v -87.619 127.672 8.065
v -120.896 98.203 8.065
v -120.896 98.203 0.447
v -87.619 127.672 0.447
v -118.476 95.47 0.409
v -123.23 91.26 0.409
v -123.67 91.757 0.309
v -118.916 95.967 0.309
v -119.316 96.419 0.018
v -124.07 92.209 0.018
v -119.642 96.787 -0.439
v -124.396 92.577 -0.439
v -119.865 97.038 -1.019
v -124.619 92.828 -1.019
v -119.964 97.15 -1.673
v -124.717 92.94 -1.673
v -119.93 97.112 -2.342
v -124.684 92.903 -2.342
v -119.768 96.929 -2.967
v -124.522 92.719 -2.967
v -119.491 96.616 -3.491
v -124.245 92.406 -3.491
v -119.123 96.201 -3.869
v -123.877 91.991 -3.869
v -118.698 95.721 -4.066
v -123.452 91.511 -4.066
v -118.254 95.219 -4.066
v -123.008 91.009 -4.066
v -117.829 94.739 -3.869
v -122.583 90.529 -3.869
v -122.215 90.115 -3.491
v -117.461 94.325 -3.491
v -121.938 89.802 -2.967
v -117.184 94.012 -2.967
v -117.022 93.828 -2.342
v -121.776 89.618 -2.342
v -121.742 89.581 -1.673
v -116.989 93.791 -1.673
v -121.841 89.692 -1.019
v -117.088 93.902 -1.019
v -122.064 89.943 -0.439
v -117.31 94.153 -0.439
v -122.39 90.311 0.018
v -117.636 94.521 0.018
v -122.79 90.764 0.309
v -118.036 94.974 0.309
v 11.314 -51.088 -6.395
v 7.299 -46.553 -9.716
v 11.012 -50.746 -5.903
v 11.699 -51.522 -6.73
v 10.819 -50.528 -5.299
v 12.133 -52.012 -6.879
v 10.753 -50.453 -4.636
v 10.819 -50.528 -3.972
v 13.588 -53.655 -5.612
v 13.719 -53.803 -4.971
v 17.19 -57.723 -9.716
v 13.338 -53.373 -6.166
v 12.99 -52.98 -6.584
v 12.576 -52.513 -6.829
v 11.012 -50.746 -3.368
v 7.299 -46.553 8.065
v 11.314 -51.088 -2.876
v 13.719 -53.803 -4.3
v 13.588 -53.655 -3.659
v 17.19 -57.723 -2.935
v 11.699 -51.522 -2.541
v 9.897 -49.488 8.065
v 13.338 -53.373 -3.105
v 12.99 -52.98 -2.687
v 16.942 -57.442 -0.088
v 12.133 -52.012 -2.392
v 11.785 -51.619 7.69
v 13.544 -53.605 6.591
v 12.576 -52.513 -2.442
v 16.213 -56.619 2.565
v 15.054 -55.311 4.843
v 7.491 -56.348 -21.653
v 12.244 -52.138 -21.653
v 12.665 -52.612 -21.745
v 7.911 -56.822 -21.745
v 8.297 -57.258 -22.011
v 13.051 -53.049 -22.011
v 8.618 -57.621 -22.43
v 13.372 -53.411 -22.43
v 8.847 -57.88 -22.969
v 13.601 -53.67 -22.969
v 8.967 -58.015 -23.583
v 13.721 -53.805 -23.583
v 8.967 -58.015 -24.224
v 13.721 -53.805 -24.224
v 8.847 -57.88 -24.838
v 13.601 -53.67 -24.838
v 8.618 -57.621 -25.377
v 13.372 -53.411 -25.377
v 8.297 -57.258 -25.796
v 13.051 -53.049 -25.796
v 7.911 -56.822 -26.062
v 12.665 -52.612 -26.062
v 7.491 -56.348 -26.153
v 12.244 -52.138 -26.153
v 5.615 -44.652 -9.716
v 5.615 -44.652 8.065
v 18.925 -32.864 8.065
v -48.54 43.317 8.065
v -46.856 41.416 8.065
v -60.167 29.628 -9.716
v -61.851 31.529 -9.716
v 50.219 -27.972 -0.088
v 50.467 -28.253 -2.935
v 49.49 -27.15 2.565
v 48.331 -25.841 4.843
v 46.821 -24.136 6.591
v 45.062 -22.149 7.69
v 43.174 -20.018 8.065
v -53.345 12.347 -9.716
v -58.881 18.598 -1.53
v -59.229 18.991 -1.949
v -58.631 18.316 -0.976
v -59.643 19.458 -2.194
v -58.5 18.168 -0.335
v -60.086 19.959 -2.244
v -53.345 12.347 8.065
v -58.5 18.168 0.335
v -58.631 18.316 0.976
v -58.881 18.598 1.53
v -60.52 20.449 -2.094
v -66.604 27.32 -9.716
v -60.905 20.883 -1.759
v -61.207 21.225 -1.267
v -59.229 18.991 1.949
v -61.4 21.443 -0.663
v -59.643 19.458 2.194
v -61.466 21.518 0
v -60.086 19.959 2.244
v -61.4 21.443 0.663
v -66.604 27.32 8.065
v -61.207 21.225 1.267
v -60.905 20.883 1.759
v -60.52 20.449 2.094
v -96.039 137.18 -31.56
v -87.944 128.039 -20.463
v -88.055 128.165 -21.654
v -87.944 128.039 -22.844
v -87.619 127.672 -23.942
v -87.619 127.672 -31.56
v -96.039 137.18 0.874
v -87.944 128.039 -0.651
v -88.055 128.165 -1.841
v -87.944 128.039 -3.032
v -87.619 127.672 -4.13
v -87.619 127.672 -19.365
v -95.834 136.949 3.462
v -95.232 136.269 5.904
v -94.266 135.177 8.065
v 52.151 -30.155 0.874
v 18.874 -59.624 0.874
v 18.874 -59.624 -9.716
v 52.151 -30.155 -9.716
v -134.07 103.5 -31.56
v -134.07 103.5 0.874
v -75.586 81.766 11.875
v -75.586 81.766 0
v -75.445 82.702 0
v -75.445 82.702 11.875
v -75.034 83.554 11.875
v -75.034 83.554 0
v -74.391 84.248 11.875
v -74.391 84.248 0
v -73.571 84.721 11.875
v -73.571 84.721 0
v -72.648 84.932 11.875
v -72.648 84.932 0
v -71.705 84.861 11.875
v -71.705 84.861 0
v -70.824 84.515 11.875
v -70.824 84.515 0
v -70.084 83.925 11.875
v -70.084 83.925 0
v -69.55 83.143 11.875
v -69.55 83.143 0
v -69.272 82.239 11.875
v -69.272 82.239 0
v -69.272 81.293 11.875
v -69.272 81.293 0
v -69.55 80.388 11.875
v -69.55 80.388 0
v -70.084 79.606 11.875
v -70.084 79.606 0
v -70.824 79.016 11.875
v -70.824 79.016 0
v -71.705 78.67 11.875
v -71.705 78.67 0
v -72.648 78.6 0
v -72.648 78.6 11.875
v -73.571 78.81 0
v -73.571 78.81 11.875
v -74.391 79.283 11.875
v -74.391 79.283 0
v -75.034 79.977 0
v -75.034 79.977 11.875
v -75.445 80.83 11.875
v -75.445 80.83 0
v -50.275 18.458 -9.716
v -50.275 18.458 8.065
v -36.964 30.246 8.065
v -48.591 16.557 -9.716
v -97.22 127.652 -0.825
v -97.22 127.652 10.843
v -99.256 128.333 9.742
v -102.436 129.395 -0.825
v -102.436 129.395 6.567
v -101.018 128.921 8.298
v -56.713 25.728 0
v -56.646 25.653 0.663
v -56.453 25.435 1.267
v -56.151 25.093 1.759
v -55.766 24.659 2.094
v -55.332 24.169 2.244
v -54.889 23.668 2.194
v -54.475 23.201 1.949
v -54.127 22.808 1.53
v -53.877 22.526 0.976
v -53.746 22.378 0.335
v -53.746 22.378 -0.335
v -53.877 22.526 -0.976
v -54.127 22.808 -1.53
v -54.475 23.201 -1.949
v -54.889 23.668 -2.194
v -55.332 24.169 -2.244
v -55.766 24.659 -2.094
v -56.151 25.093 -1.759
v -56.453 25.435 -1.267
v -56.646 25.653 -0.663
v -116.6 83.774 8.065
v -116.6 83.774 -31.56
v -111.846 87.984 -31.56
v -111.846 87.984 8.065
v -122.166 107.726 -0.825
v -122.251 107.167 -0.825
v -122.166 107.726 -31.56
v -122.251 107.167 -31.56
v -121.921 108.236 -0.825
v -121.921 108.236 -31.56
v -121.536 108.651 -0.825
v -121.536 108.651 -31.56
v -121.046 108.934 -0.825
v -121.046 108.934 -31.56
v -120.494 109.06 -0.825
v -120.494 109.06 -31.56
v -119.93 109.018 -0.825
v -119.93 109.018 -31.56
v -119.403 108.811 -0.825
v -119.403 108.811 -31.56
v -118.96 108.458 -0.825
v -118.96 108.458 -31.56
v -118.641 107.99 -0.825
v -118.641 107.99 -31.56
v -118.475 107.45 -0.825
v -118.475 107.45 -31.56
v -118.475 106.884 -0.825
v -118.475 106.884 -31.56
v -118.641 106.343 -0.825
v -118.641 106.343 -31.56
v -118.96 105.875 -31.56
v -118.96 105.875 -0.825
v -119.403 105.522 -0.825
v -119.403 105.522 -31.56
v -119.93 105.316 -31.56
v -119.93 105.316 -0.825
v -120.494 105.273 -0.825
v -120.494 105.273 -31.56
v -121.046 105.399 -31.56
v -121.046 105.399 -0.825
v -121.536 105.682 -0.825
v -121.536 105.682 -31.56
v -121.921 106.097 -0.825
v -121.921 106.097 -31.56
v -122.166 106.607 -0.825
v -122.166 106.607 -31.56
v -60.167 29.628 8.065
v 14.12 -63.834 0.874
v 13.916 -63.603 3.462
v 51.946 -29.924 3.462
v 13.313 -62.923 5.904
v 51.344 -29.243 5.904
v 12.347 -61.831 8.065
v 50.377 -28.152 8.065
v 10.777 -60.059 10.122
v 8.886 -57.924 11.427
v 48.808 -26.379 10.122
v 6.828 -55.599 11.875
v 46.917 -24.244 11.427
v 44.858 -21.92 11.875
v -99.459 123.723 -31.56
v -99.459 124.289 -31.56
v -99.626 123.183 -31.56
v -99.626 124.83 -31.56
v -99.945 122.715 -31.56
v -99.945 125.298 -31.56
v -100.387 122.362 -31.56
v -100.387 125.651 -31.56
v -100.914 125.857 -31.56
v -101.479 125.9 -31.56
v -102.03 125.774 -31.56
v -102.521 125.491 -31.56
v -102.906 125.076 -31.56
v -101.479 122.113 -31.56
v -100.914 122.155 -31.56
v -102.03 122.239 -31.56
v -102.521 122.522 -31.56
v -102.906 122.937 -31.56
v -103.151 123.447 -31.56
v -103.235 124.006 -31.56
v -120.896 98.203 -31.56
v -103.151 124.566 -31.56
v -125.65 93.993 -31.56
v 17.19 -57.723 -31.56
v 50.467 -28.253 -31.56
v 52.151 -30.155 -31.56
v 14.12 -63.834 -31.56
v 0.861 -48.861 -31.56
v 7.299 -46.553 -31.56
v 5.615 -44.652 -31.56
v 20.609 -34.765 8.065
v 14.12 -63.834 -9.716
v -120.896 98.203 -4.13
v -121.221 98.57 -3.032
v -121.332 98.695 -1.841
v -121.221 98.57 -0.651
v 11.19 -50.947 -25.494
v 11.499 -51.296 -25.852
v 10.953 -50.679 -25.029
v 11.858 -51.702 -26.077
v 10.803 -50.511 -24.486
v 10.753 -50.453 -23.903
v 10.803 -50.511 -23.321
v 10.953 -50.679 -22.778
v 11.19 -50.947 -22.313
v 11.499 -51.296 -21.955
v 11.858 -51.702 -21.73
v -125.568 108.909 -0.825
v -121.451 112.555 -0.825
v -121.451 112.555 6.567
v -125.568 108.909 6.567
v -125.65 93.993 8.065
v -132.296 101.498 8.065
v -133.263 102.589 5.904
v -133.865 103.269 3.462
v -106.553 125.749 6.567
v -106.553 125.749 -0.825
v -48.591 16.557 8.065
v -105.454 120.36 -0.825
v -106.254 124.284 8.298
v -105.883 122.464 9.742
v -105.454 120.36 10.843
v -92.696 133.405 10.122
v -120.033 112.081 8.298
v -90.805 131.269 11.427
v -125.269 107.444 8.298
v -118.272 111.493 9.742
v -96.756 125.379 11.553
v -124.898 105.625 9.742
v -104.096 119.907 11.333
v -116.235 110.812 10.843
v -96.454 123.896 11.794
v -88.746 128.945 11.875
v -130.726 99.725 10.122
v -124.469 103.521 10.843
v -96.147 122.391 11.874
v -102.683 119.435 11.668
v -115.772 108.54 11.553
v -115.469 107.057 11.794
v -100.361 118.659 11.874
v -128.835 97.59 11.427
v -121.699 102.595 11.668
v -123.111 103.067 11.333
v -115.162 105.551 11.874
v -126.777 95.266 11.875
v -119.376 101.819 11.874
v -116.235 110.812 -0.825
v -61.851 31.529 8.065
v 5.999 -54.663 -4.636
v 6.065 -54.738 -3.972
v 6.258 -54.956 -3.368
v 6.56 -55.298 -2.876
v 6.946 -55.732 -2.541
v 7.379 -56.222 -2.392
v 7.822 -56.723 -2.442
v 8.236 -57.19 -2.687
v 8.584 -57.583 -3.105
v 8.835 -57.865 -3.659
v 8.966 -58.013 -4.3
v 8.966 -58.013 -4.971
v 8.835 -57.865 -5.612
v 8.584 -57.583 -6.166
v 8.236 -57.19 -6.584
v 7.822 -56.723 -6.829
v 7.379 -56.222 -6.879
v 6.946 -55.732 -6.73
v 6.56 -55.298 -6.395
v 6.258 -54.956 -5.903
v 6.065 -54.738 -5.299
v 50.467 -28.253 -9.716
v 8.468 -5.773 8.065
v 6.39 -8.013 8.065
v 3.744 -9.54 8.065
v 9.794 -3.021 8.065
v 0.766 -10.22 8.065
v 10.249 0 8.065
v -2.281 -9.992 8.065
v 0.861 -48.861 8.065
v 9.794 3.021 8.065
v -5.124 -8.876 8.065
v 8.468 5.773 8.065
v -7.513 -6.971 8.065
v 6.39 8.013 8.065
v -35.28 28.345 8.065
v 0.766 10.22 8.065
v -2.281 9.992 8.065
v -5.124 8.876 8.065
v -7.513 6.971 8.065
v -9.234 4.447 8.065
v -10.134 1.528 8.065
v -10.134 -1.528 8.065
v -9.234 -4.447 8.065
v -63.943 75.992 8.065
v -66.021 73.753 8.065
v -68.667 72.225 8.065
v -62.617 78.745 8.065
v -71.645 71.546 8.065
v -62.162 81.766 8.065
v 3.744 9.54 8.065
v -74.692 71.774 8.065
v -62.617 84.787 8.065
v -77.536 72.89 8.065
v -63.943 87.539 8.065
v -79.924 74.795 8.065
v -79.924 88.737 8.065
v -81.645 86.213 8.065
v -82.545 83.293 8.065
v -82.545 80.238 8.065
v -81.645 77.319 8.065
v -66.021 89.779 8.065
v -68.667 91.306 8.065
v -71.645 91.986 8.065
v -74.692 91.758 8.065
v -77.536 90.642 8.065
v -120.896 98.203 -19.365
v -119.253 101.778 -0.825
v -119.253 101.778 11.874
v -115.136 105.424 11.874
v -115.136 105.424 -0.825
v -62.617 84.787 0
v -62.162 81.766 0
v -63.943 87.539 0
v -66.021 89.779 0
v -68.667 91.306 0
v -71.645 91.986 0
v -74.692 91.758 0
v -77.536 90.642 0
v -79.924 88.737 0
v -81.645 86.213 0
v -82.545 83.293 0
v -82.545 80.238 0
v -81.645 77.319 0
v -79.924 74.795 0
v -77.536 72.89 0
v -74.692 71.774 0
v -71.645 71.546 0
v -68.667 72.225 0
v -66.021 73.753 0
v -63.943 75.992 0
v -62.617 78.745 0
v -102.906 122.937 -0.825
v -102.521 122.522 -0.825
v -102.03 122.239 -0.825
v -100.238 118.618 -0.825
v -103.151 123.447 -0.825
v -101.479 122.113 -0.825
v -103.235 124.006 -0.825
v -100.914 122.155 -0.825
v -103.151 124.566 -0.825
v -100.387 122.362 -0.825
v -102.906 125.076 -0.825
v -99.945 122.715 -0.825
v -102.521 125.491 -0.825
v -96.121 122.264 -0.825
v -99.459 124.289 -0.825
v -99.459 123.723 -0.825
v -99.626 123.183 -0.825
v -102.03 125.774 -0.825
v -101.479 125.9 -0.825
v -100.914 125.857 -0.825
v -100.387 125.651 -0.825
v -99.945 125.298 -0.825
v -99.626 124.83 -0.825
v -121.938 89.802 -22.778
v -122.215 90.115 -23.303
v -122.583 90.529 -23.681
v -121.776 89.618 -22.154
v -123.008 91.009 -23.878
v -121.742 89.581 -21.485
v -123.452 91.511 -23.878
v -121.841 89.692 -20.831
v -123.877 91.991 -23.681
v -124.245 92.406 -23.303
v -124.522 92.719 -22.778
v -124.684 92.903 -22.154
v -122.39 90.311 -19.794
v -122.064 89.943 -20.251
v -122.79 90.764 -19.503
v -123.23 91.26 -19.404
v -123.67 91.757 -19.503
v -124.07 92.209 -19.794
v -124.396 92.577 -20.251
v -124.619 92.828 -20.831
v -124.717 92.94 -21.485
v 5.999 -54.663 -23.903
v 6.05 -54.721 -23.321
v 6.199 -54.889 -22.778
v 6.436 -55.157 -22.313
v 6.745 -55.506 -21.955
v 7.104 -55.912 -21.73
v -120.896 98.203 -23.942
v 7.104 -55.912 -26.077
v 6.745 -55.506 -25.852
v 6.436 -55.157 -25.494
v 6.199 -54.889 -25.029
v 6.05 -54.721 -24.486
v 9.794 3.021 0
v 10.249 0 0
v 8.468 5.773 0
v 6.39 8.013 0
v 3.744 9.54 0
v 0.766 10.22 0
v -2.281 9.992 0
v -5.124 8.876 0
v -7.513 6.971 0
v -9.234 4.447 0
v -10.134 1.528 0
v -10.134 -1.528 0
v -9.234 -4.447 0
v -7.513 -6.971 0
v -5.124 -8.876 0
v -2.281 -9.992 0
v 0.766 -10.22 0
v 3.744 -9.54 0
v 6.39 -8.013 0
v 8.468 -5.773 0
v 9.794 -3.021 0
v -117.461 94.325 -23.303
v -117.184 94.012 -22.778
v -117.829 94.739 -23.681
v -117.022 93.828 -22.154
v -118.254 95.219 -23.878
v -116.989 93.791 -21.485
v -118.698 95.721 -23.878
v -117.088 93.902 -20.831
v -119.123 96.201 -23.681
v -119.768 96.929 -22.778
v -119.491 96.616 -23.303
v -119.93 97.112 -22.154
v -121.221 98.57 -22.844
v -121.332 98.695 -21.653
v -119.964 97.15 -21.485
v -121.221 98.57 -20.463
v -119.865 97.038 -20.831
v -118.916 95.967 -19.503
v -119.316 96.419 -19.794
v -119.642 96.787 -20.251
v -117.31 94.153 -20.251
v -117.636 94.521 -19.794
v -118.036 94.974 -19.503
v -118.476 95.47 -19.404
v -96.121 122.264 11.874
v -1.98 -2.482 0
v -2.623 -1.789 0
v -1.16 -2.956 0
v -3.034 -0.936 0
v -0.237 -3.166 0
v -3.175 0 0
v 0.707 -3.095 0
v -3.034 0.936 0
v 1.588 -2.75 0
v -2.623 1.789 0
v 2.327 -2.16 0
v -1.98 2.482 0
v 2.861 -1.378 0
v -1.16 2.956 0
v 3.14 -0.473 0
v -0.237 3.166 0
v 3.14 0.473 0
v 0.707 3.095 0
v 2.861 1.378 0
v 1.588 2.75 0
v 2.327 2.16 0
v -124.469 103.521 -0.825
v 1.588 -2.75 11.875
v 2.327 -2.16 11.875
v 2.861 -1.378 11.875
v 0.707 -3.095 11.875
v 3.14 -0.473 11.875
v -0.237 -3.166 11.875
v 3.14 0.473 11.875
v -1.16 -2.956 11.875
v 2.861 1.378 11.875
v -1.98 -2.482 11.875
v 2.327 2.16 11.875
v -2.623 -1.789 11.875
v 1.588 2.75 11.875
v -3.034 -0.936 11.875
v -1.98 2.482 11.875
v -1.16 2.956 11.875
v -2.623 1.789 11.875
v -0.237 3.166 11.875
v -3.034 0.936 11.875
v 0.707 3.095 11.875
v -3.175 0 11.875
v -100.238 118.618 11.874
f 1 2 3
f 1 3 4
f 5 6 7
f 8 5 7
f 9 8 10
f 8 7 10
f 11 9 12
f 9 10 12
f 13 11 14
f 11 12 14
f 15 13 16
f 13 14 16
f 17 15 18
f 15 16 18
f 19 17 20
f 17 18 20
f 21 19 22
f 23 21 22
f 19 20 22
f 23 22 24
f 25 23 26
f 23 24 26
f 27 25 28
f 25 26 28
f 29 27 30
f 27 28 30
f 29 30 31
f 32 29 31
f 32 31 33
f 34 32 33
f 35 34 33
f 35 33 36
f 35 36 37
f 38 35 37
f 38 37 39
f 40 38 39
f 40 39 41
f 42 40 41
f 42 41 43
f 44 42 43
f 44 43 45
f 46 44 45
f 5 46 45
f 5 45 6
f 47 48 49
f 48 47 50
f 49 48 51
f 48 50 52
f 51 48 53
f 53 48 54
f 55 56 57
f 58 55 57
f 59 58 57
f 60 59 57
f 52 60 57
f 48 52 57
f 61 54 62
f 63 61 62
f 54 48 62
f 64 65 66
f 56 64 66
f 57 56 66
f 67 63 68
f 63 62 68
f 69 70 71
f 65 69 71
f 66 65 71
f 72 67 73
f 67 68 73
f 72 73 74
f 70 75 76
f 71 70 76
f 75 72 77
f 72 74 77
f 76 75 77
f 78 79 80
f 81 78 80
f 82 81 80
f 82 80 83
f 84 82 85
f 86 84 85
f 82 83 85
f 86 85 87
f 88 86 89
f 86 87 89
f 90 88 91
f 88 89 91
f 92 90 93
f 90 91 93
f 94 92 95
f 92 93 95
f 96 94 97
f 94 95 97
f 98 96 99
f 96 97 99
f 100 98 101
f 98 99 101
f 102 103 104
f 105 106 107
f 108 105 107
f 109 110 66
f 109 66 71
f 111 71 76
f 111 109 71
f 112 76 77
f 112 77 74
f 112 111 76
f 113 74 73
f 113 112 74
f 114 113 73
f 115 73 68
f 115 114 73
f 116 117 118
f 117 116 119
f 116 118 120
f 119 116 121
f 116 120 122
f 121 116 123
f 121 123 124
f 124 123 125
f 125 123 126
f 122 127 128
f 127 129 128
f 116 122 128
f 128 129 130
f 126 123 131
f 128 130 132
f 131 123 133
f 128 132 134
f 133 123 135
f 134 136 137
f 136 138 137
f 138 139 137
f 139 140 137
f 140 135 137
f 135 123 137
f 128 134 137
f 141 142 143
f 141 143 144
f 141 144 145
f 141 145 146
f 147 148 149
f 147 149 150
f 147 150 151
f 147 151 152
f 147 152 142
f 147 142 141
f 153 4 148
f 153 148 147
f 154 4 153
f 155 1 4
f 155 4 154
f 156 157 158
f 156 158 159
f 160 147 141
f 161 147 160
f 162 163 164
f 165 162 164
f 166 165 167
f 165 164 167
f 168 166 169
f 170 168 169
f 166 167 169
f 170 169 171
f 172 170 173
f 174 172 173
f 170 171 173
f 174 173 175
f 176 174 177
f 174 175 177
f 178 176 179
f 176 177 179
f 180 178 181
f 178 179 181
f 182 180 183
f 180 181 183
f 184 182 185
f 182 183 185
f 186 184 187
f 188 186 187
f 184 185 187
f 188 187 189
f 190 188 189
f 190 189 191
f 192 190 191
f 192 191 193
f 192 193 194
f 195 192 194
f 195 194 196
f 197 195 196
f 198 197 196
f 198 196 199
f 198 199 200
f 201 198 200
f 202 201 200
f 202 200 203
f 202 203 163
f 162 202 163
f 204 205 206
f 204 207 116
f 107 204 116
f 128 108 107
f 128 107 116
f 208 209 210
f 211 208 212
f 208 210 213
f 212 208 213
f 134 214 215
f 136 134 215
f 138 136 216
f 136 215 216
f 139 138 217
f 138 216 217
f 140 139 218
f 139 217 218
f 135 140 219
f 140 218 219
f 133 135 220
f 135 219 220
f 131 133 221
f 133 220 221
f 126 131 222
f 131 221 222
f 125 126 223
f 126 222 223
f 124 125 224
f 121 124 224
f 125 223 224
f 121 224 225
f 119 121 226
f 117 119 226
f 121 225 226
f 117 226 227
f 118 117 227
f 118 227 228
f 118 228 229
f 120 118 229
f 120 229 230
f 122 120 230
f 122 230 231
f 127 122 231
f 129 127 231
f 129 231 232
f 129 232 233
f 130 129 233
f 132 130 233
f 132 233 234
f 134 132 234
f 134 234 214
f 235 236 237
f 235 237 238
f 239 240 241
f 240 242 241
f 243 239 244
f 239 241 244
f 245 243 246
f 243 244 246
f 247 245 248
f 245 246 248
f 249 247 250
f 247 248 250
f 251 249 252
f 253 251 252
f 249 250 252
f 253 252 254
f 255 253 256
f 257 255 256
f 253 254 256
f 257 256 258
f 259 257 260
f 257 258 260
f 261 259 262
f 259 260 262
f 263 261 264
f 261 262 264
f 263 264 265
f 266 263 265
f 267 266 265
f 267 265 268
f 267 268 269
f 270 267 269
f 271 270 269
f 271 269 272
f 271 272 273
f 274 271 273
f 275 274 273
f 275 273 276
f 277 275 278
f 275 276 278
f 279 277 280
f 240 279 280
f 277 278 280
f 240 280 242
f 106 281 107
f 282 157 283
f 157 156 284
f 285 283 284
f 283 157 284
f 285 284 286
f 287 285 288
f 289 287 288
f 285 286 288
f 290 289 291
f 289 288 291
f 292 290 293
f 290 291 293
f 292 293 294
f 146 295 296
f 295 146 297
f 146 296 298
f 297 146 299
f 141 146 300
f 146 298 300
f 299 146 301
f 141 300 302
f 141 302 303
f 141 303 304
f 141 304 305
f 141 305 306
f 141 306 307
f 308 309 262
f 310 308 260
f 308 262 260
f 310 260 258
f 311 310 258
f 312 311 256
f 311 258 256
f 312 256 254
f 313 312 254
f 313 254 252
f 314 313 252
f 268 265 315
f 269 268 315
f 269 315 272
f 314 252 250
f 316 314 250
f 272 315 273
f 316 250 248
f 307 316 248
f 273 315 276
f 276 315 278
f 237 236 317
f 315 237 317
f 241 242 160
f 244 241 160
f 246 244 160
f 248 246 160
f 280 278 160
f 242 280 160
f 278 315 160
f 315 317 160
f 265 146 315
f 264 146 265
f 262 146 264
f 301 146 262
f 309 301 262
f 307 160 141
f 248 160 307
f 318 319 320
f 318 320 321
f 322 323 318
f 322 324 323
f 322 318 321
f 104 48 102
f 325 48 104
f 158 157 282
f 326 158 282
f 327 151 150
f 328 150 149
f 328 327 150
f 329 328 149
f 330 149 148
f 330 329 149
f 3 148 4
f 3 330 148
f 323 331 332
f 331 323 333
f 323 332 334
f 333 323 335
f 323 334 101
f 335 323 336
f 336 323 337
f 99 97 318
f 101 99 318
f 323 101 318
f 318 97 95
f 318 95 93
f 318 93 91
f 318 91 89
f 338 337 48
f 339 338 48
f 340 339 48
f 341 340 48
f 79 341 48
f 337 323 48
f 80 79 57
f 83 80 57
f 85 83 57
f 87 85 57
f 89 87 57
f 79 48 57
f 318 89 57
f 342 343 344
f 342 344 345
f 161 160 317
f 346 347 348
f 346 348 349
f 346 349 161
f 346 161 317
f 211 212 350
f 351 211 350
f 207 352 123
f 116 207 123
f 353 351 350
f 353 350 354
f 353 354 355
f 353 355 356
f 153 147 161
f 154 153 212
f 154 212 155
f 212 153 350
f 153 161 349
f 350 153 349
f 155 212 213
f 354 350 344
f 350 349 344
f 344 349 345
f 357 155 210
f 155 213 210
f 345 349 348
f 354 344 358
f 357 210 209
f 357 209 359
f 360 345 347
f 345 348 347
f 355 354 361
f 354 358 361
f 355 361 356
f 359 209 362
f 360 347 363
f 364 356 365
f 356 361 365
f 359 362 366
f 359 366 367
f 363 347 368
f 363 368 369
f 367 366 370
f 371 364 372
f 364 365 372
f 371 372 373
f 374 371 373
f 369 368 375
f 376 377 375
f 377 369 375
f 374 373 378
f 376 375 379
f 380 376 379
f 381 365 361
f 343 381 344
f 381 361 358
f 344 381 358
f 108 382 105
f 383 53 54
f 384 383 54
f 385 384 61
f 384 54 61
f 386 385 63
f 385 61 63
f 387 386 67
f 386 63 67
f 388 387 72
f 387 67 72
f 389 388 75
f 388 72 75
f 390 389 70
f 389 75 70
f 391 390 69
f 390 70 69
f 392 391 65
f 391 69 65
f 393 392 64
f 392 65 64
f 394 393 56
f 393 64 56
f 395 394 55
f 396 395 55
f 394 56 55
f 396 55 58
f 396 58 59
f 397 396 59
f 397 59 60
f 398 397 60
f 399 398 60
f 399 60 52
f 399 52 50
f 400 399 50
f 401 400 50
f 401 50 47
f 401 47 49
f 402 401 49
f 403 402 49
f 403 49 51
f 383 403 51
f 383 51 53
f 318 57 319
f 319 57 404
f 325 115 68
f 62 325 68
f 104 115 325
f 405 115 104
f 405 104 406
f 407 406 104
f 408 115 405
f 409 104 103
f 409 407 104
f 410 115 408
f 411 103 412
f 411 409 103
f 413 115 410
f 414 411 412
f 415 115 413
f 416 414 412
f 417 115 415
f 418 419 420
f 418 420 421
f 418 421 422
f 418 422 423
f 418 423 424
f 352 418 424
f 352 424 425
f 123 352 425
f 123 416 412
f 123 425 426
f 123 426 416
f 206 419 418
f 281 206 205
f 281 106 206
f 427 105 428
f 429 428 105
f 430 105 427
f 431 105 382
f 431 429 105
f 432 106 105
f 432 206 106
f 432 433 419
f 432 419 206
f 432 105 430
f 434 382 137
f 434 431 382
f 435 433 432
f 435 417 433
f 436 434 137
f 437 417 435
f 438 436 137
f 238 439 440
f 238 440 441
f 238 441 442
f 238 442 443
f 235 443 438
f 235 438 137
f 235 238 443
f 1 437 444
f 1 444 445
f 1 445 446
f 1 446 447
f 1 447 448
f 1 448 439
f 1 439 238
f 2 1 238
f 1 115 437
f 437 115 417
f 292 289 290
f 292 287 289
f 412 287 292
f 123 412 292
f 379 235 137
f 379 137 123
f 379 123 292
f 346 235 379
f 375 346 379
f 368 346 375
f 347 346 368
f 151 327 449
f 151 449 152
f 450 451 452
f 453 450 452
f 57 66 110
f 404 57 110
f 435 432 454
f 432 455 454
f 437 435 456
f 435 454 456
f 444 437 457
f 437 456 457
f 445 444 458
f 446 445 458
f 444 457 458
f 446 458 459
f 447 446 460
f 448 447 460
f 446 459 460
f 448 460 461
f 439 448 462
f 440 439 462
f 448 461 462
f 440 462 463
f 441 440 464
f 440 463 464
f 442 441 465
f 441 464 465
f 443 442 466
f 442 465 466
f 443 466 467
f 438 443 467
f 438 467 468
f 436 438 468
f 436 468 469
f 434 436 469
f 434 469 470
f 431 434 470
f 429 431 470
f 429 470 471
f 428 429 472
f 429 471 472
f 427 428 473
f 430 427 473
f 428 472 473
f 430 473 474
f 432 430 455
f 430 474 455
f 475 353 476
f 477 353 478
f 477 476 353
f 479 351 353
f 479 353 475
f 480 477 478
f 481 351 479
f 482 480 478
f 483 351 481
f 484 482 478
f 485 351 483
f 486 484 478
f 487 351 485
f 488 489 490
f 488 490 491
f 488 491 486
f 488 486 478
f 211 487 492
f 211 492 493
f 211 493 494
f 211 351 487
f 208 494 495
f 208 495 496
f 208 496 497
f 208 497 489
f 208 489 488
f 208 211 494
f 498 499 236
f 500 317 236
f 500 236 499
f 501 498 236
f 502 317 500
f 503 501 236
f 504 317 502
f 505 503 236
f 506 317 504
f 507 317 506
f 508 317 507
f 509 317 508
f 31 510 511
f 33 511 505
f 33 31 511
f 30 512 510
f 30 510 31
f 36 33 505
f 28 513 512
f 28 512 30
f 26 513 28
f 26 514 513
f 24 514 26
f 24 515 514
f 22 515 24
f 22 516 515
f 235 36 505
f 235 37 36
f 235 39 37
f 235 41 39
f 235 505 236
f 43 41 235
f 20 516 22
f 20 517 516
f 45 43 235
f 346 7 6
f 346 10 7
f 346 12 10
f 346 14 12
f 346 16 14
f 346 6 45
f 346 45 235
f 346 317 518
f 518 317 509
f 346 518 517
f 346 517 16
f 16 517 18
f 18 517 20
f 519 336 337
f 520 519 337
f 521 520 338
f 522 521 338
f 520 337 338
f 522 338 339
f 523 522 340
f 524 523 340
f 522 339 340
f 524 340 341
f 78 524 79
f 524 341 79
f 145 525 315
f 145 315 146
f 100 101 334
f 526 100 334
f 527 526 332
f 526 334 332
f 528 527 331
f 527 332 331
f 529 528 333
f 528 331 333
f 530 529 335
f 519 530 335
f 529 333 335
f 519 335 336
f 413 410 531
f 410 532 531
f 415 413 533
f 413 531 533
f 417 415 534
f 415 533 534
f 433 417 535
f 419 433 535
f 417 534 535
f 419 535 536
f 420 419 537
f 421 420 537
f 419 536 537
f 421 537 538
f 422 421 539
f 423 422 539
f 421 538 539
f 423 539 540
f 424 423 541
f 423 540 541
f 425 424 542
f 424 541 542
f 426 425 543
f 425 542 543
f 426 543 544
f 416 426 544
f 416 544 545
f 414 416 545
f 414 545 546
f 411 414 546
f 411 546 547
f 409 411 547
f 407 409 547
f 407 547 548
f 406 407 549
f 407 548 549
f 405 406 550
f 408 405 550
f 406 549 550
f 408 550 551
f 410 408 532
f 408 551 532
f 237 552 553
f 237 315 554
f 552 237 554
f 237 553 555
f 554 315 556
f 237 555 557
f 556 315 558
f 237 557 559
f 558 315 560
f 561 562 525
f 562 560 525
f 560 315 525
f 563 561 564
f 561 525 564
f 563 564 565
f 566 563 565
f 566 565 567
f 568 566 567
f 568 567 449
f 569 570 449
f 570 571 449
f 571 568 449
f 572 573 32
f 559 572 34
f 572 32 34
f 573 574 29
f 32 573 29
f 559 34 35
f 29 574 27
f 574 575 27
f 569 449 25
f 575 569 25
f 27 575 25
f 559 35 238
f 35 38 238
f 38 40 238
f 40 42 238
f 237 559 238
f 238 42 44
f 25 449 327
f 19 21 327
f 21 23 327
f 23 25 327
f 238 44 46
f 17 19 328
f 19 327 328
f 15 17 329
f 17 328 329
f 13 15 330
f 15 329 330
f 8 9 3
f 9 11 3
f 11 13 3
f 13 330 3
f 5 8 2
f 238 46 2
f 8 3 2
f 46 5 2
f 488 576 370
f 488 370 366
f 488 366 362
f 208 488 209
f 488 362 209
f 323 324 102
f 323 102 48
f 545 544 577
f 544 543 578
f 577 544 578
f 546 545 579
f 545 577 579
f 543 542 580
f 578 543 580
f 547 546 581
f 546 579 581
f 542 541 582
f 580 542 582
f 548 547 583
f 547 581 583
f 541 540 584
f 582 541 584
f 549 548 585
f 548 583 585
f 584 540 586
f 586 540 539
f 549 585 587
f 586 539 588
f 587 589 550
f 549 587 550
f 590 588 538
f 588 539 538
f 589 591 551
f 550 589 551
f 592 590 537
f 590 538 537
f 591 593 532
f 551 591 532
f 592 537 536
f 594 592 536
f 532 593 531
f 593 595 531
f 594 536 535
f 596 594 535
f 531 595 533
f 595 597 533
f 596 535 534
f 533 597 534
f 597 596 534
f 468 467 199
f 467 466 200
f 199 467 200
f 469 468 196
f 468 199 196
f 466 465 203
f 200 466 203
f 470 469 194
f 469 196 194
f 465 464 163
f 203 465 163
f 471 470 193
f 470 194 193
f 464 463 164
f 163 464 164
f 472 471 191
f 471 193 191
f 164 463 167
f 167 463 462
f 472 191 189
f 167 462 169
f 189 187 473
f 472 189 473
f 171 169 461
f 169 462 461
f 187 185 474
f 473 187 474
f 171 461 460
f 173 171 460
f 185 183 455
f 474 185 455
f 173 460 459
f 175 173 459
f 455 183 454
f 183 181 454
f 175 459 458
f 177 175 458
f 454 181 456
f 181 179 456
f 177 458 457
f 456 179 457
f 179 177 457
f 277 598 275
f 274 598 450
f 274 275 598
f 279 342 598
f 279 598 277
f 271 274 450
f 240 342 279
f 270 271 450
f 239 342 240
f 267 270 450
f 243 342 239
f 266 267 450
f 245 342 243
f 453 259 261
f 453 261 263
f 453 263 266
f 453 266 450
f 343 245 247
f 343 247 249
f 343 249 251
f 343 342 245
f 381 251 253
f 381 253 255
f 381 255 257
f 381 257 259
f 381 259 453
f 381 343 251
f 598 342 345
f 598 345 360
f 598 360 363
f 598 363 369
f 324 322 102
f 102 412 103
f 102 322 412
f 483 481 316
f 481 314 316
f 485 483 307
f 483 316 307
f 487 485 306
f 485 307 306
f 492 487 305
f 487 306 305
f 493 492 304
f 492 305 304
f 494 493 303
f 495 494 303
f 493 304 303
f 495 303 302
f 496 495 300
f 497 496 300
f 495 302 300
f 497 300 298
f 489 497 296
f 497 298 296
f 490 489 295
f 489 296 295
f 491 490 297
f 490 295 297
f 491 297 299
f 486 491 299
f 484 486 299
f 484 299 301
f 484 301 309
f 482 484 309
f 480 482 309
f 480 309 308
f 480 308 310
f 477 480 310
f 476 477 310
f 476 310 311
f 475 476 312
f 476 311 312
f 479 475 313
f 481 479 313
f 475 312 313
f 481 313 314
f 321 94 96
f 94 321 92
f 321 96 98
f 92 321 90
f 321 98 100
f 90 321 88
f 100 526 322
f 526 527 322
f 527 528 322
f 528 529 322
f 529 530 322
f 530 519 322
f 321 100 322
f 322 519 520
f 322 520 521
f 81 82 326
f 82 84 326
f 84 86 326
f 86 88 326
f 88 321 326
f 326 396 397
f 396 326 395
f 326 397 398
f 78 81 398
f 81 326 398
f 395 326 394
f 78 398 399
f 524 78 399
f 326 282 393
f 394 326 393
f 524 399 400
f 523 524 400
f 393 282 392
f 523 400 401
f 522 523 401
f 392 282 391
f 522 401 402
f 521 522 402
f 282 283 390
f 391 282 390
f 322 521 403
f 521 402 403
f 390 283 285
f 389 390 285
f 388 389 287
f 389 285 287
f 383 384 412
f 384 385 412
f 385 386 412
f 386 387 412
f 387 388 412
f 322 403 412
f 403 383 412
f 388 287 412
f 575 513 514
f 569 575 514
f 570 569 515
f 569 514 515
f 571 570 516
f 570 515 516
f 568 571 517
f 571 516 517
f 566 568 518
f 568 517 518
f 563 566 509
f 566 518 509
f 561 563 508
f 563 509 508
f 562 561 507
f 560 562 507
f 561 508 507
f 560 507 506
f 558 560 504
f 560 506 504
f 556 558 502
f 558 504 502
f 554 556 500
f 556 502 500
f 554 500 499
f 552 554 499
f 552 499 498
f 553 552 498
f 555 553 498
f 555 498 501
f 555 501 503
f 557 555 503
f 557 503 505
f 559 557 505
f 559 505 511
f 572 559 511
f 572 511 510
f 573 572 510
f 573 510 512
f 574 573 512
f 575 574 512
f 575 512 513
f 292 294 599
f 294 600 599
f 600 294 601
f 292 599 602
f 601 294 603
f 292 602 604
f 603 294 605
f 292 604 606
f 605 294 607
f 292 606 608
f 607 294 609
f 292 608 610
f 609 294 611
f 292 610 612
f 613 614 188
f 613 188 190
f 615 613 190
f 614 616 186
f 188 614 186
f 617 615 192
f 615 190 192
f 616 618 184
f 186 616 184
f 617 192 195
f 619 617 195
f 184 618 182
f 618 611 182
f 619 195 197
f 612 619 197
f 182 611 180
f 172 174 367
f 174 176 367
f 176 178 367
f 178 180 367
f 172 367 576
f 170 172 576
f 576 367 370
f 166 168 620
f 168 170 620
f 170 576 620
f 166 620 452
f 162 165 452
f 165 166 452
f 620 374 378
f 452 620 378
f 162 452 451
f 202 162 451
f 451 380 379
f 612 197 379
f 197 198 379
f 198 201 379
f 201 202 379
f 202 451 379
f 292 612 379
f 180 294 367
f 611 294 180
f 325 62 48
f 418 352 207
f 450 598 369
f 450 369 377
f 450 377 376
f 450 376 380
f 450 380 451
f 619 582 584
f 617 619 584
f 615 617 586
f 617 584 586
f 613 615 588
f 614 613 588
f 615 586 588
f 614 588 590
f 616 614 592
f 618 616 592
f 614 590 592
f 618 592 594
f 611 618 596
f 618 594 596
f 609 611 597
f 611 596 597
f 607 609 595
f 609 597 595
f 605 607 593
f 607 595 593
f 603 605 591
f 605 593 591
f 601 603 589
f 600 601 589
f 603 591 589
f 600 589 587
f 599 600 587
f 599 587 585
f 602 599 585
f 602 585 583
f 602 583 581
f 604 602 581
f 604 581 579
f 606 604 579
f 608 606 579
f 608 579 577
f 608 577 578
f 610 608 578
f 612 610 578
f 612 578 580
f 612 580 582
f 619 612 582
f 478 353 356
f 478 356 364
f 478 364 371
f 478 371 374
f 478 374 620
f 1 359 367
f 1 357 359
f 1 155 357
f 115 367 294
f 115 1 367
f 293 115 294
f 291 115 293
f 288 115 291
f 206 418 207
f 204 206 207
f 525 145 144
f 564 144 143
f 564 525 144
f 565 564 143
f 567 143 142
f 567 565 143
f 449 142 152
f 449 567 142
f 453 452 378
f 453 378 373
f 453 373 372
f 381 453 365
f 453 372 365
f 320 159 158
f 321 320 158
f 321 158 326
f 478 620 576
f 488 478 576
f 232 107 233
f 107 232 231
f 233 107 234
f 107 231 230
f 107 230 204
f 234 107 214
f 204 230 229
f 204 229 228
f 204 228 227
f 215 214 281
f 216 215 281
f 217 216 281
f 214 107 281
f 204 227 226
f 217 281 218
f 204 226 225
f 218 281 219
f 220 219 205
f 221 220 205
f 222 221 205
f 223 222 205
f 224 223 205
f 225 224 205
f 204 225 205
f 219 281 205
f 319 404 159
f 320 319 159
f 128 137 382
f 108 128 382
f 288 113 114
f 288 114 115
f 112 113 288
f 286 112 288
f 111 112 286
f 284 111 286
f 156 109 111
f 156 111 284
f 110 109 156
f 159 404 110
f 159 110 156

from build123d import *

# Parameters (mm, degrees)
SKETCH1_R                   = 10.2489
BOSS_EXTRUDE1_DEPTH         = 2.9845
BOSS_EXTRUDE1_2_DEPTH       = 2.9845
SKETCH2_R                   = 10.2489
BOSS_EXTRUDE2_DEPTH         = 5.08
BOSS_EXTRUDE3_DEPTH         = 3.81
F_1_4_0_25_DIAMETER_HOLE1_D = 6.35
BOSS_EXTRUDE4_DEPTH         = 17.78
SKETCH8_R                   = 2.25
CUT_EXTRUDE1_DEPTH          = 17.78
SKETCH9_W                   = 17.78
SKETCH9_H                   = 2.54
BOSS_EXTRUDE5_DEPTH         = 17.78
CUT_EXTRUDE2_REACH          = 251.195
CUT_EXTRUDE3_DEPTH          = 20
BOSS_EXTRUDE6_DEPTH         = 2.54
BOSS_EXTRUDE7_DEPTH         = 39.624
F_6_CLEARANCE_HOLE1_D       = 3.7973
CUT_EXTRUDE4_DEPTH          = 6.35
SKETCH17_W                  = 39.624
SKETCH17_H                  = 20
BOSS_EXTRUDE8_DEPTH         = 6.35
M4_CLEARANCE_HOLE1_D        = 4.5
SKETCH21_R                  = 4.308
CUT_EXTRUDE5_DEPTH          = 195.822050963
FILLET2_R                   = 11
CUT_EXTRUDE6_DEPTH          = 6.35
BOSS_EXTRUDE9_DEPTH         = 21.844
CUT_EXTRUDE7_DEPTH          = 195.822050963


with BuildPart() as part:
    # Sketch1 → Boss-Extrude1 (new body)
    with BuildSketch(Plane.XY):
        Circle(SKETCH1_R)
    extrude(amount=BOSS_EXTRUDE1_DEPTH)



with BuildPart() as body_2:
    # Sketch1 → Boss-Extrude1 2 (new body)
    with BuildSketch(Plane.XY):
        with Locations((-72.411066703, 81.765798589)):
            Circle(SKETCH1_R)
    extrude(amount=BOSS_EXTRUDE1_2_DEPTH)


with BuildPart() as part_1:
    add(part.part)

    add(body_2.part)  # Boss-Extrude2 merges body 2
    # Sketch2 → Boss-Extrude2 (add)
    with BuildSketch(Plane.XY.offset(2.9845)):
        with Locations((-72.411066703, 81.765798589)):
            Circle(SKETCH2_R)
        Circle(SKETCH2_R)
    extrude(amount=BOSS_EXTRUDE2_DEPTH)

    # Sketch3 → Boss-Extrude3 (add)
    with BuildSketch(Plane.XY.offset(8.0645)):
        Polygon((-134.069705847, 103.500499391), (-96.039101852, 137.180065299), (52.150988145, -30.154592279), (14.12038415, -63.834158187), align=None)
    extrude(amount=BOSS_EXTRUDE3_DEPTH)

    # 1/4 (0.25) Diameter Hole1 (through all)
    with Locations(Plane.XY.offset(11.8745)):
        with Locations((0, 0), (-72.411066703, 81.765798589)):
            Hole(F_1_4_0_25_DIAMETER_HOLE1_D / 2)

    # Sketch7 → Boss-Extrude4 (add)
    with BuildSketch(Plane(origin=(0, 0, 8.0645), x_dir=(-1, 0, 0), z_dir=(0, 0, -1))):
        Polygon((66.604496657, 27.319509971), (61.850671158, 31.529455709), (48.59099954, 16.556776971), (53.34482504, 12.346831233), align=None)
        Polygon((-14.12038415, -63.834158187), (-0.860712533, -48.861479449), (-5.614538032, -44.65153371), (-18.87420965, -59.624212449), align=None)
    extrude(amount=BOSS_EXTRUDE4_DEPTH)

    # Sketch8 → Cut-Extrude1 (cut)
    with BuildSketch(Plane(origin=(-19.015301997, -16.839782954, 0), x_dir=(0, 0, -1), z_dir=(0.7486339369082557, 0.6629835808745536, 0))):
        with Locations(Location((4.6355, -47.15, 0), (0, 0, 90))):
            Circle(SKETCH8_R)
        with Locations(Location((0, 54.61, 0), (0, 0, 90))):
            Circle(SKETCH8_R)
    extrude(amount=-CUT_EXTRUDE1_DEPTH, mode=Mode.SUBTRACT)

    # Sketch9 → Boss-Extrude5 (add)
    with BuildSketch(Plane(origin=(-19.015301997, -16.839782954, 0), x_dir=(0, 0, -1), z_dir=(0.7486339369082557, 0.6629835808745536, 0))):
        with Locations((0.8255, -55.88)):
            Rectangle(SKETCH9_W, SKETCH9_H)
        with Locations((0.8255, 45.88)):
            Rectangle(SKETCH9_W, SKETCH9_H)
        with Locations((0.8255, 63.34)):
            Rectangle(SKETCH9_W, SKETCH9_H)
        with Locations((0.8255, -38.42)):
            Rectangle(SKETCH9_W, SKETCH9_H)
    extrude(amount=BOSS_EXTRUDE5_DEPTH)

    # Cut-Extrude2: up to this face of the body (flat: up to its plane)
    cut_extrude2_end = Plane(part_1.part.faces().sort_by_distance((9.892980981, -40.862582546, -0.8255))[0])
    # Sketch10 → Cut-Extrude2 (cut, up to the picked face)
    with BuildSketch(Plane(origin=(37.889511647, -42.784429494, 0), x_dir=(0.7486339369082557, 0.6629835808745536, 0), z_dir=(0.6629835808745536, -0.7486339369082557, 0)), mode=Mode.PRIVATE) as cut_extrude2_sk1:
        Polygon((-7.62, 8.0645), (-7.62, -9.7155), (-25.4, -9.7155), align=None)
    cut_extrude2_tool1 = split(extrude(cut_extrude2_sk1.sketch, amount=-CUT_EXTRUDE2_REACH, mode=Mode.PRIVATE), bisect_by=cut_extrude2_end, keep=Keep.BOTH, mode=Mode.PRIVATE)
    add(cut_extrude2_tool1.solids().sort_by(Axis((27.748017, -51.765647, -3.788833), (-0.6629835808745536, 0.7486339369082557, 0)))[0], mode=Mode.SUBTRACT)

    # Sketch11 → Cut-Extrude3 (cut)
    with BuildSketch(Plane(origin=(-29.575697543, 33.396559925, 0), x_dir=(0.748633936908256, 0.6629835808745533, 0), z_dir=(0.6629835808745533, -0.748633936908256, 0))):
        Polygon((-7.62, -9.7155), (-7.62, 8.0645), (-25.4, -9.7155), align=None)
    extrude(amount=-CUT_EXTRUDE3_DEPTH, mode=Mode.SUBTRACT)

    # Sketch12 → Boss-Extrude6 (add)
    with BuildSketch(Plane(origin=(37.889511647, -42.784429494, 0), x_dir=(0.7486339369082557, 0.6629835808745536, 0), z_dir=(0.6629835808745536, -0.7486339369082557, 0))):
        Polygon((-25.4, -9.7155), (19.05, -9.7155), (19.05, 8.0645), (-7.62, 8.0645), align=None)
    extrude(amount=-BOSS_EXTRUDE6_DEPTH)

    # Sketch13 → Boss-Extrude7 (add)
    with BuildSketch(Plane(origin=(0, 0, 8.0645), x_dir=(-1, 0, 0), z_dir=(0, 0, -1))):
        Polygon((96.039101852, 137.180065299), (134.069705847, 103.500499391), (125.64981437, 93.992848392), (87.619210375, 127.6724143), align=None)
    extrude(amount=BOSS_EXTRUDE7_DEPTH)

    # #6 Clearance Hole1 (through all)
    with Locations(Plane.XY.offset(11.8745)):
        with Locations((-120.35210911, 107.166565368), (-101.336807112, 124.006348323)):
            Hole(F_6_CLEARANCE_HOLE1_D / 2)

    # Sketch14 → Cut-Extrude4 (cut)
    with BuildSketch(Plane.XY.offset(11.8745)):
        Polygon((-106.55273324, 125.748757468), (-105.45374076, 120.360428364), (-97.219873465, 127.652268281), (-102.435799592, 129.394677426), align=None)
        Polygon((-97.219873465, 127.652268281), (-105.45374076, 120.360428364), (-100.237814632, 118.618019219), (-96.120880984, 122.263939177), align=None)
        Polygon((-125.568035237, 108.908974514), (-124.469042757, 103.52064541), (-116.235175462, 110.812485327), (-121.45110159, 112.554894472), align=None)
        Polygon((-116.235175462, 110.812485327), (-124.469042757, 103.52064541), (-119.25311663, 101.778236265), (-115.136182982, 105.424156223), align=None)
    extrude(amount=-CUT_EXTRUDE4_DEPTH, mode=Mode.SUBTRACT)

    # Sketch17 → Boss-Extrude8 (add)
    with BuildSketch(Plane(origin=(-23.769127497, -21.049728693, 0), x_dir=(0, 0, 1), z_dir=(-0.7486339369082559, -0.6629835808745536, 0))):
        with Locations((-11.7475, 150.02)):
            Rectangle(SKETCH17_W, SKETCH17_H)
    extrude(amount=-BOSS_EXTRUDE8_DEPTH)

    # M4 Clearance Hole1 (through all)
    with Locations(Plane(origin=(-19.015301997, -16.839782954, 0), x_dir=(0, 0, -1), z_dir=(0.7486339369082559, 0.6629835808745536, 0))):
        with Locations((1.8415, 150.02), (21.6535, 150.02)):
            Hole(M4_CLEARANCE_HOLE1_D / 2)

    # Sketch21 → Cut-Extrude5 (cut, through all)
    with BuildSketch(Plane(origin=(-19.015301997, -16.839782954, 0), x_dir=(0, 0, -1), z_dir=(0.7486339369082559, 0.6629835808745536, 0))):
        with Locations((21.6535, 150.02)):
            Circle(SKETCH21_R)
        with Locations((1.8415, 150.02)):
            Circle(SKETCH21_R)
    extrude(amount=CUT_EXTRUDE5_DEPTH, mode=Mode.SUBTRACT)

    # Fillet2
    # the kernel refuses this fillet: 11 mm, written as the material it adds along each edge
    with BuildSketch(Plane(origin=(50.46700985, -28.253062079, 8.0645), x_dir=(-0.6629835808745533, 0.7486339369082559, 1.2918958832001814e-15), z_dir=(-0.748633936908256, -0.6629835808745534, 0))) as fillet2_piece_1:
        with BuildLine():
            CenterArc((FILLET2_R, FILLET2_R), FILLET2_R, 180, 90)
            Line((0, FILLET2_R), (0, 0))
            Line((0, 0), (FILLET2_R, 0))
        make_face()
    extrude(amount=44.45)
    # the kernel refuses this fillet: 11 mm, written as the material it takes off along each edge
    with BuildSketch(Plane(origin=(72.73842141, -11.922543805, 11.8745), x_dir=(-0.6629835808745536, 0.7486339369082557, 0), z_dir=(-0.7486339369082559, -0.6629835808745537, 0))) as fillet2_2_piece_1:
        with BuildLine():
            CenterArc((FILLET2_R, FILLET2_R), FILLET2_R, 180, 90)
            Line((0, FILLET2_R), (0, 0))
            Line((0, 0), (FILLET2_R, 0))
        make_face()
    extrude(amount=105.8, mode=Mode.SUBTRACT)
    with BuildSketch(Plane(origin=(-154.657139112, 85.268450917, 11.8745), x_dir=(0, 0, -1), z_dir=(0.7486339369082557, 0.6629835808745537, 0))) as fillet2_2_piece_2:
        with BuildLine():
            CenterArc((FILLET2_R, -FILLET2_R), FILLET2_R, 90, 90)
            Line((0, -FILLET2_R), (0, 0))
            Line((0, 0), (FILLET2_R, 0))
        make_face()
    extrude(amount=105.8, mode=Mode.SUBTRACT)

    # Sketch22 → Cut-Extrude6 (cut)
    with BuildSketch(Plane.XY.offset(5.5245)):
        Polygon((-121.45110159, 112.554894472), (-125.568035237, 108.908974514), (-124.469042757, 103.52064541), (-119.25311663, 101.778236265), (-115.136182982, 105.424156223), (-116.235175462, 110.812485327), align=None)
        Polygon((-102.435799592, 129.394677426), (-106.55273324, 125.748757468), (-105.45374076, 120.360428364), (-100.237814632, 118.618019219), (-96.120880984, 122.263939177), (-97.219873465, 127.652268281), align=None)
    extrude(amount=-CUT_EXTRUDE6_DEPTH, mode=Mode.SUBTRACT)

    # Sketch24 → Boss-Extrude9 (add)
    with BuildSketch(Plane(origin=(0, 0, -9.7155), x_dir=(-1, 0, 0), z_dir=(0, 0, -1))):
        Polygon((-7.298516327, -46.55306391), (-17.190231354, -57.722682249), (-50.46700985, -28.253062079), (-52.150988145, -30.154592279), (-14.12038415, -63.834158187), (-0.860712533, -48.861479449), (-5.614538032, -44.65153371), align=None)
    extrude(amount=BOSS_EXTRUDE9_DEPTH)

    # Sketch25 → Cut-Extrude7 (cut, through all)
    with BuildSketch(Plane(origin=(-19.015301997, -16.839782954, 0), x_dir=(0, 0, -1), z_dir=(0.7486339369082557, 0.6629835808745536, 0))):
        with BuildLine():
            ThreePointArc((26.1535, -47.15), (25.494490258, -45.559009742), (23.9035, -44.9))
            Line((23.9035, -44.9), (23.9035, -47.15))
            Line((23.9035, -47.15), (21.6535, -47.15))
            ThreePointArc((21.6535, -47.15), (23.9035, -49.4), (26.1535, -47.15))
        make_face()
        with BuildLine():
            Line((23.9035, -47.15), (23.9035, -44.9))
            ThreePointArc((23.9035, -44.9), (22.312509742, -45.559009742), (21.6535, -47.15))
            Line((21.6535, -47.15), (23.9035, -47.15))
        make_face()
    extrude(amount=-CUT_EXTRUDE7_DEPTH, mode=Mode.SUBTRACT)


solid = part_1.part
